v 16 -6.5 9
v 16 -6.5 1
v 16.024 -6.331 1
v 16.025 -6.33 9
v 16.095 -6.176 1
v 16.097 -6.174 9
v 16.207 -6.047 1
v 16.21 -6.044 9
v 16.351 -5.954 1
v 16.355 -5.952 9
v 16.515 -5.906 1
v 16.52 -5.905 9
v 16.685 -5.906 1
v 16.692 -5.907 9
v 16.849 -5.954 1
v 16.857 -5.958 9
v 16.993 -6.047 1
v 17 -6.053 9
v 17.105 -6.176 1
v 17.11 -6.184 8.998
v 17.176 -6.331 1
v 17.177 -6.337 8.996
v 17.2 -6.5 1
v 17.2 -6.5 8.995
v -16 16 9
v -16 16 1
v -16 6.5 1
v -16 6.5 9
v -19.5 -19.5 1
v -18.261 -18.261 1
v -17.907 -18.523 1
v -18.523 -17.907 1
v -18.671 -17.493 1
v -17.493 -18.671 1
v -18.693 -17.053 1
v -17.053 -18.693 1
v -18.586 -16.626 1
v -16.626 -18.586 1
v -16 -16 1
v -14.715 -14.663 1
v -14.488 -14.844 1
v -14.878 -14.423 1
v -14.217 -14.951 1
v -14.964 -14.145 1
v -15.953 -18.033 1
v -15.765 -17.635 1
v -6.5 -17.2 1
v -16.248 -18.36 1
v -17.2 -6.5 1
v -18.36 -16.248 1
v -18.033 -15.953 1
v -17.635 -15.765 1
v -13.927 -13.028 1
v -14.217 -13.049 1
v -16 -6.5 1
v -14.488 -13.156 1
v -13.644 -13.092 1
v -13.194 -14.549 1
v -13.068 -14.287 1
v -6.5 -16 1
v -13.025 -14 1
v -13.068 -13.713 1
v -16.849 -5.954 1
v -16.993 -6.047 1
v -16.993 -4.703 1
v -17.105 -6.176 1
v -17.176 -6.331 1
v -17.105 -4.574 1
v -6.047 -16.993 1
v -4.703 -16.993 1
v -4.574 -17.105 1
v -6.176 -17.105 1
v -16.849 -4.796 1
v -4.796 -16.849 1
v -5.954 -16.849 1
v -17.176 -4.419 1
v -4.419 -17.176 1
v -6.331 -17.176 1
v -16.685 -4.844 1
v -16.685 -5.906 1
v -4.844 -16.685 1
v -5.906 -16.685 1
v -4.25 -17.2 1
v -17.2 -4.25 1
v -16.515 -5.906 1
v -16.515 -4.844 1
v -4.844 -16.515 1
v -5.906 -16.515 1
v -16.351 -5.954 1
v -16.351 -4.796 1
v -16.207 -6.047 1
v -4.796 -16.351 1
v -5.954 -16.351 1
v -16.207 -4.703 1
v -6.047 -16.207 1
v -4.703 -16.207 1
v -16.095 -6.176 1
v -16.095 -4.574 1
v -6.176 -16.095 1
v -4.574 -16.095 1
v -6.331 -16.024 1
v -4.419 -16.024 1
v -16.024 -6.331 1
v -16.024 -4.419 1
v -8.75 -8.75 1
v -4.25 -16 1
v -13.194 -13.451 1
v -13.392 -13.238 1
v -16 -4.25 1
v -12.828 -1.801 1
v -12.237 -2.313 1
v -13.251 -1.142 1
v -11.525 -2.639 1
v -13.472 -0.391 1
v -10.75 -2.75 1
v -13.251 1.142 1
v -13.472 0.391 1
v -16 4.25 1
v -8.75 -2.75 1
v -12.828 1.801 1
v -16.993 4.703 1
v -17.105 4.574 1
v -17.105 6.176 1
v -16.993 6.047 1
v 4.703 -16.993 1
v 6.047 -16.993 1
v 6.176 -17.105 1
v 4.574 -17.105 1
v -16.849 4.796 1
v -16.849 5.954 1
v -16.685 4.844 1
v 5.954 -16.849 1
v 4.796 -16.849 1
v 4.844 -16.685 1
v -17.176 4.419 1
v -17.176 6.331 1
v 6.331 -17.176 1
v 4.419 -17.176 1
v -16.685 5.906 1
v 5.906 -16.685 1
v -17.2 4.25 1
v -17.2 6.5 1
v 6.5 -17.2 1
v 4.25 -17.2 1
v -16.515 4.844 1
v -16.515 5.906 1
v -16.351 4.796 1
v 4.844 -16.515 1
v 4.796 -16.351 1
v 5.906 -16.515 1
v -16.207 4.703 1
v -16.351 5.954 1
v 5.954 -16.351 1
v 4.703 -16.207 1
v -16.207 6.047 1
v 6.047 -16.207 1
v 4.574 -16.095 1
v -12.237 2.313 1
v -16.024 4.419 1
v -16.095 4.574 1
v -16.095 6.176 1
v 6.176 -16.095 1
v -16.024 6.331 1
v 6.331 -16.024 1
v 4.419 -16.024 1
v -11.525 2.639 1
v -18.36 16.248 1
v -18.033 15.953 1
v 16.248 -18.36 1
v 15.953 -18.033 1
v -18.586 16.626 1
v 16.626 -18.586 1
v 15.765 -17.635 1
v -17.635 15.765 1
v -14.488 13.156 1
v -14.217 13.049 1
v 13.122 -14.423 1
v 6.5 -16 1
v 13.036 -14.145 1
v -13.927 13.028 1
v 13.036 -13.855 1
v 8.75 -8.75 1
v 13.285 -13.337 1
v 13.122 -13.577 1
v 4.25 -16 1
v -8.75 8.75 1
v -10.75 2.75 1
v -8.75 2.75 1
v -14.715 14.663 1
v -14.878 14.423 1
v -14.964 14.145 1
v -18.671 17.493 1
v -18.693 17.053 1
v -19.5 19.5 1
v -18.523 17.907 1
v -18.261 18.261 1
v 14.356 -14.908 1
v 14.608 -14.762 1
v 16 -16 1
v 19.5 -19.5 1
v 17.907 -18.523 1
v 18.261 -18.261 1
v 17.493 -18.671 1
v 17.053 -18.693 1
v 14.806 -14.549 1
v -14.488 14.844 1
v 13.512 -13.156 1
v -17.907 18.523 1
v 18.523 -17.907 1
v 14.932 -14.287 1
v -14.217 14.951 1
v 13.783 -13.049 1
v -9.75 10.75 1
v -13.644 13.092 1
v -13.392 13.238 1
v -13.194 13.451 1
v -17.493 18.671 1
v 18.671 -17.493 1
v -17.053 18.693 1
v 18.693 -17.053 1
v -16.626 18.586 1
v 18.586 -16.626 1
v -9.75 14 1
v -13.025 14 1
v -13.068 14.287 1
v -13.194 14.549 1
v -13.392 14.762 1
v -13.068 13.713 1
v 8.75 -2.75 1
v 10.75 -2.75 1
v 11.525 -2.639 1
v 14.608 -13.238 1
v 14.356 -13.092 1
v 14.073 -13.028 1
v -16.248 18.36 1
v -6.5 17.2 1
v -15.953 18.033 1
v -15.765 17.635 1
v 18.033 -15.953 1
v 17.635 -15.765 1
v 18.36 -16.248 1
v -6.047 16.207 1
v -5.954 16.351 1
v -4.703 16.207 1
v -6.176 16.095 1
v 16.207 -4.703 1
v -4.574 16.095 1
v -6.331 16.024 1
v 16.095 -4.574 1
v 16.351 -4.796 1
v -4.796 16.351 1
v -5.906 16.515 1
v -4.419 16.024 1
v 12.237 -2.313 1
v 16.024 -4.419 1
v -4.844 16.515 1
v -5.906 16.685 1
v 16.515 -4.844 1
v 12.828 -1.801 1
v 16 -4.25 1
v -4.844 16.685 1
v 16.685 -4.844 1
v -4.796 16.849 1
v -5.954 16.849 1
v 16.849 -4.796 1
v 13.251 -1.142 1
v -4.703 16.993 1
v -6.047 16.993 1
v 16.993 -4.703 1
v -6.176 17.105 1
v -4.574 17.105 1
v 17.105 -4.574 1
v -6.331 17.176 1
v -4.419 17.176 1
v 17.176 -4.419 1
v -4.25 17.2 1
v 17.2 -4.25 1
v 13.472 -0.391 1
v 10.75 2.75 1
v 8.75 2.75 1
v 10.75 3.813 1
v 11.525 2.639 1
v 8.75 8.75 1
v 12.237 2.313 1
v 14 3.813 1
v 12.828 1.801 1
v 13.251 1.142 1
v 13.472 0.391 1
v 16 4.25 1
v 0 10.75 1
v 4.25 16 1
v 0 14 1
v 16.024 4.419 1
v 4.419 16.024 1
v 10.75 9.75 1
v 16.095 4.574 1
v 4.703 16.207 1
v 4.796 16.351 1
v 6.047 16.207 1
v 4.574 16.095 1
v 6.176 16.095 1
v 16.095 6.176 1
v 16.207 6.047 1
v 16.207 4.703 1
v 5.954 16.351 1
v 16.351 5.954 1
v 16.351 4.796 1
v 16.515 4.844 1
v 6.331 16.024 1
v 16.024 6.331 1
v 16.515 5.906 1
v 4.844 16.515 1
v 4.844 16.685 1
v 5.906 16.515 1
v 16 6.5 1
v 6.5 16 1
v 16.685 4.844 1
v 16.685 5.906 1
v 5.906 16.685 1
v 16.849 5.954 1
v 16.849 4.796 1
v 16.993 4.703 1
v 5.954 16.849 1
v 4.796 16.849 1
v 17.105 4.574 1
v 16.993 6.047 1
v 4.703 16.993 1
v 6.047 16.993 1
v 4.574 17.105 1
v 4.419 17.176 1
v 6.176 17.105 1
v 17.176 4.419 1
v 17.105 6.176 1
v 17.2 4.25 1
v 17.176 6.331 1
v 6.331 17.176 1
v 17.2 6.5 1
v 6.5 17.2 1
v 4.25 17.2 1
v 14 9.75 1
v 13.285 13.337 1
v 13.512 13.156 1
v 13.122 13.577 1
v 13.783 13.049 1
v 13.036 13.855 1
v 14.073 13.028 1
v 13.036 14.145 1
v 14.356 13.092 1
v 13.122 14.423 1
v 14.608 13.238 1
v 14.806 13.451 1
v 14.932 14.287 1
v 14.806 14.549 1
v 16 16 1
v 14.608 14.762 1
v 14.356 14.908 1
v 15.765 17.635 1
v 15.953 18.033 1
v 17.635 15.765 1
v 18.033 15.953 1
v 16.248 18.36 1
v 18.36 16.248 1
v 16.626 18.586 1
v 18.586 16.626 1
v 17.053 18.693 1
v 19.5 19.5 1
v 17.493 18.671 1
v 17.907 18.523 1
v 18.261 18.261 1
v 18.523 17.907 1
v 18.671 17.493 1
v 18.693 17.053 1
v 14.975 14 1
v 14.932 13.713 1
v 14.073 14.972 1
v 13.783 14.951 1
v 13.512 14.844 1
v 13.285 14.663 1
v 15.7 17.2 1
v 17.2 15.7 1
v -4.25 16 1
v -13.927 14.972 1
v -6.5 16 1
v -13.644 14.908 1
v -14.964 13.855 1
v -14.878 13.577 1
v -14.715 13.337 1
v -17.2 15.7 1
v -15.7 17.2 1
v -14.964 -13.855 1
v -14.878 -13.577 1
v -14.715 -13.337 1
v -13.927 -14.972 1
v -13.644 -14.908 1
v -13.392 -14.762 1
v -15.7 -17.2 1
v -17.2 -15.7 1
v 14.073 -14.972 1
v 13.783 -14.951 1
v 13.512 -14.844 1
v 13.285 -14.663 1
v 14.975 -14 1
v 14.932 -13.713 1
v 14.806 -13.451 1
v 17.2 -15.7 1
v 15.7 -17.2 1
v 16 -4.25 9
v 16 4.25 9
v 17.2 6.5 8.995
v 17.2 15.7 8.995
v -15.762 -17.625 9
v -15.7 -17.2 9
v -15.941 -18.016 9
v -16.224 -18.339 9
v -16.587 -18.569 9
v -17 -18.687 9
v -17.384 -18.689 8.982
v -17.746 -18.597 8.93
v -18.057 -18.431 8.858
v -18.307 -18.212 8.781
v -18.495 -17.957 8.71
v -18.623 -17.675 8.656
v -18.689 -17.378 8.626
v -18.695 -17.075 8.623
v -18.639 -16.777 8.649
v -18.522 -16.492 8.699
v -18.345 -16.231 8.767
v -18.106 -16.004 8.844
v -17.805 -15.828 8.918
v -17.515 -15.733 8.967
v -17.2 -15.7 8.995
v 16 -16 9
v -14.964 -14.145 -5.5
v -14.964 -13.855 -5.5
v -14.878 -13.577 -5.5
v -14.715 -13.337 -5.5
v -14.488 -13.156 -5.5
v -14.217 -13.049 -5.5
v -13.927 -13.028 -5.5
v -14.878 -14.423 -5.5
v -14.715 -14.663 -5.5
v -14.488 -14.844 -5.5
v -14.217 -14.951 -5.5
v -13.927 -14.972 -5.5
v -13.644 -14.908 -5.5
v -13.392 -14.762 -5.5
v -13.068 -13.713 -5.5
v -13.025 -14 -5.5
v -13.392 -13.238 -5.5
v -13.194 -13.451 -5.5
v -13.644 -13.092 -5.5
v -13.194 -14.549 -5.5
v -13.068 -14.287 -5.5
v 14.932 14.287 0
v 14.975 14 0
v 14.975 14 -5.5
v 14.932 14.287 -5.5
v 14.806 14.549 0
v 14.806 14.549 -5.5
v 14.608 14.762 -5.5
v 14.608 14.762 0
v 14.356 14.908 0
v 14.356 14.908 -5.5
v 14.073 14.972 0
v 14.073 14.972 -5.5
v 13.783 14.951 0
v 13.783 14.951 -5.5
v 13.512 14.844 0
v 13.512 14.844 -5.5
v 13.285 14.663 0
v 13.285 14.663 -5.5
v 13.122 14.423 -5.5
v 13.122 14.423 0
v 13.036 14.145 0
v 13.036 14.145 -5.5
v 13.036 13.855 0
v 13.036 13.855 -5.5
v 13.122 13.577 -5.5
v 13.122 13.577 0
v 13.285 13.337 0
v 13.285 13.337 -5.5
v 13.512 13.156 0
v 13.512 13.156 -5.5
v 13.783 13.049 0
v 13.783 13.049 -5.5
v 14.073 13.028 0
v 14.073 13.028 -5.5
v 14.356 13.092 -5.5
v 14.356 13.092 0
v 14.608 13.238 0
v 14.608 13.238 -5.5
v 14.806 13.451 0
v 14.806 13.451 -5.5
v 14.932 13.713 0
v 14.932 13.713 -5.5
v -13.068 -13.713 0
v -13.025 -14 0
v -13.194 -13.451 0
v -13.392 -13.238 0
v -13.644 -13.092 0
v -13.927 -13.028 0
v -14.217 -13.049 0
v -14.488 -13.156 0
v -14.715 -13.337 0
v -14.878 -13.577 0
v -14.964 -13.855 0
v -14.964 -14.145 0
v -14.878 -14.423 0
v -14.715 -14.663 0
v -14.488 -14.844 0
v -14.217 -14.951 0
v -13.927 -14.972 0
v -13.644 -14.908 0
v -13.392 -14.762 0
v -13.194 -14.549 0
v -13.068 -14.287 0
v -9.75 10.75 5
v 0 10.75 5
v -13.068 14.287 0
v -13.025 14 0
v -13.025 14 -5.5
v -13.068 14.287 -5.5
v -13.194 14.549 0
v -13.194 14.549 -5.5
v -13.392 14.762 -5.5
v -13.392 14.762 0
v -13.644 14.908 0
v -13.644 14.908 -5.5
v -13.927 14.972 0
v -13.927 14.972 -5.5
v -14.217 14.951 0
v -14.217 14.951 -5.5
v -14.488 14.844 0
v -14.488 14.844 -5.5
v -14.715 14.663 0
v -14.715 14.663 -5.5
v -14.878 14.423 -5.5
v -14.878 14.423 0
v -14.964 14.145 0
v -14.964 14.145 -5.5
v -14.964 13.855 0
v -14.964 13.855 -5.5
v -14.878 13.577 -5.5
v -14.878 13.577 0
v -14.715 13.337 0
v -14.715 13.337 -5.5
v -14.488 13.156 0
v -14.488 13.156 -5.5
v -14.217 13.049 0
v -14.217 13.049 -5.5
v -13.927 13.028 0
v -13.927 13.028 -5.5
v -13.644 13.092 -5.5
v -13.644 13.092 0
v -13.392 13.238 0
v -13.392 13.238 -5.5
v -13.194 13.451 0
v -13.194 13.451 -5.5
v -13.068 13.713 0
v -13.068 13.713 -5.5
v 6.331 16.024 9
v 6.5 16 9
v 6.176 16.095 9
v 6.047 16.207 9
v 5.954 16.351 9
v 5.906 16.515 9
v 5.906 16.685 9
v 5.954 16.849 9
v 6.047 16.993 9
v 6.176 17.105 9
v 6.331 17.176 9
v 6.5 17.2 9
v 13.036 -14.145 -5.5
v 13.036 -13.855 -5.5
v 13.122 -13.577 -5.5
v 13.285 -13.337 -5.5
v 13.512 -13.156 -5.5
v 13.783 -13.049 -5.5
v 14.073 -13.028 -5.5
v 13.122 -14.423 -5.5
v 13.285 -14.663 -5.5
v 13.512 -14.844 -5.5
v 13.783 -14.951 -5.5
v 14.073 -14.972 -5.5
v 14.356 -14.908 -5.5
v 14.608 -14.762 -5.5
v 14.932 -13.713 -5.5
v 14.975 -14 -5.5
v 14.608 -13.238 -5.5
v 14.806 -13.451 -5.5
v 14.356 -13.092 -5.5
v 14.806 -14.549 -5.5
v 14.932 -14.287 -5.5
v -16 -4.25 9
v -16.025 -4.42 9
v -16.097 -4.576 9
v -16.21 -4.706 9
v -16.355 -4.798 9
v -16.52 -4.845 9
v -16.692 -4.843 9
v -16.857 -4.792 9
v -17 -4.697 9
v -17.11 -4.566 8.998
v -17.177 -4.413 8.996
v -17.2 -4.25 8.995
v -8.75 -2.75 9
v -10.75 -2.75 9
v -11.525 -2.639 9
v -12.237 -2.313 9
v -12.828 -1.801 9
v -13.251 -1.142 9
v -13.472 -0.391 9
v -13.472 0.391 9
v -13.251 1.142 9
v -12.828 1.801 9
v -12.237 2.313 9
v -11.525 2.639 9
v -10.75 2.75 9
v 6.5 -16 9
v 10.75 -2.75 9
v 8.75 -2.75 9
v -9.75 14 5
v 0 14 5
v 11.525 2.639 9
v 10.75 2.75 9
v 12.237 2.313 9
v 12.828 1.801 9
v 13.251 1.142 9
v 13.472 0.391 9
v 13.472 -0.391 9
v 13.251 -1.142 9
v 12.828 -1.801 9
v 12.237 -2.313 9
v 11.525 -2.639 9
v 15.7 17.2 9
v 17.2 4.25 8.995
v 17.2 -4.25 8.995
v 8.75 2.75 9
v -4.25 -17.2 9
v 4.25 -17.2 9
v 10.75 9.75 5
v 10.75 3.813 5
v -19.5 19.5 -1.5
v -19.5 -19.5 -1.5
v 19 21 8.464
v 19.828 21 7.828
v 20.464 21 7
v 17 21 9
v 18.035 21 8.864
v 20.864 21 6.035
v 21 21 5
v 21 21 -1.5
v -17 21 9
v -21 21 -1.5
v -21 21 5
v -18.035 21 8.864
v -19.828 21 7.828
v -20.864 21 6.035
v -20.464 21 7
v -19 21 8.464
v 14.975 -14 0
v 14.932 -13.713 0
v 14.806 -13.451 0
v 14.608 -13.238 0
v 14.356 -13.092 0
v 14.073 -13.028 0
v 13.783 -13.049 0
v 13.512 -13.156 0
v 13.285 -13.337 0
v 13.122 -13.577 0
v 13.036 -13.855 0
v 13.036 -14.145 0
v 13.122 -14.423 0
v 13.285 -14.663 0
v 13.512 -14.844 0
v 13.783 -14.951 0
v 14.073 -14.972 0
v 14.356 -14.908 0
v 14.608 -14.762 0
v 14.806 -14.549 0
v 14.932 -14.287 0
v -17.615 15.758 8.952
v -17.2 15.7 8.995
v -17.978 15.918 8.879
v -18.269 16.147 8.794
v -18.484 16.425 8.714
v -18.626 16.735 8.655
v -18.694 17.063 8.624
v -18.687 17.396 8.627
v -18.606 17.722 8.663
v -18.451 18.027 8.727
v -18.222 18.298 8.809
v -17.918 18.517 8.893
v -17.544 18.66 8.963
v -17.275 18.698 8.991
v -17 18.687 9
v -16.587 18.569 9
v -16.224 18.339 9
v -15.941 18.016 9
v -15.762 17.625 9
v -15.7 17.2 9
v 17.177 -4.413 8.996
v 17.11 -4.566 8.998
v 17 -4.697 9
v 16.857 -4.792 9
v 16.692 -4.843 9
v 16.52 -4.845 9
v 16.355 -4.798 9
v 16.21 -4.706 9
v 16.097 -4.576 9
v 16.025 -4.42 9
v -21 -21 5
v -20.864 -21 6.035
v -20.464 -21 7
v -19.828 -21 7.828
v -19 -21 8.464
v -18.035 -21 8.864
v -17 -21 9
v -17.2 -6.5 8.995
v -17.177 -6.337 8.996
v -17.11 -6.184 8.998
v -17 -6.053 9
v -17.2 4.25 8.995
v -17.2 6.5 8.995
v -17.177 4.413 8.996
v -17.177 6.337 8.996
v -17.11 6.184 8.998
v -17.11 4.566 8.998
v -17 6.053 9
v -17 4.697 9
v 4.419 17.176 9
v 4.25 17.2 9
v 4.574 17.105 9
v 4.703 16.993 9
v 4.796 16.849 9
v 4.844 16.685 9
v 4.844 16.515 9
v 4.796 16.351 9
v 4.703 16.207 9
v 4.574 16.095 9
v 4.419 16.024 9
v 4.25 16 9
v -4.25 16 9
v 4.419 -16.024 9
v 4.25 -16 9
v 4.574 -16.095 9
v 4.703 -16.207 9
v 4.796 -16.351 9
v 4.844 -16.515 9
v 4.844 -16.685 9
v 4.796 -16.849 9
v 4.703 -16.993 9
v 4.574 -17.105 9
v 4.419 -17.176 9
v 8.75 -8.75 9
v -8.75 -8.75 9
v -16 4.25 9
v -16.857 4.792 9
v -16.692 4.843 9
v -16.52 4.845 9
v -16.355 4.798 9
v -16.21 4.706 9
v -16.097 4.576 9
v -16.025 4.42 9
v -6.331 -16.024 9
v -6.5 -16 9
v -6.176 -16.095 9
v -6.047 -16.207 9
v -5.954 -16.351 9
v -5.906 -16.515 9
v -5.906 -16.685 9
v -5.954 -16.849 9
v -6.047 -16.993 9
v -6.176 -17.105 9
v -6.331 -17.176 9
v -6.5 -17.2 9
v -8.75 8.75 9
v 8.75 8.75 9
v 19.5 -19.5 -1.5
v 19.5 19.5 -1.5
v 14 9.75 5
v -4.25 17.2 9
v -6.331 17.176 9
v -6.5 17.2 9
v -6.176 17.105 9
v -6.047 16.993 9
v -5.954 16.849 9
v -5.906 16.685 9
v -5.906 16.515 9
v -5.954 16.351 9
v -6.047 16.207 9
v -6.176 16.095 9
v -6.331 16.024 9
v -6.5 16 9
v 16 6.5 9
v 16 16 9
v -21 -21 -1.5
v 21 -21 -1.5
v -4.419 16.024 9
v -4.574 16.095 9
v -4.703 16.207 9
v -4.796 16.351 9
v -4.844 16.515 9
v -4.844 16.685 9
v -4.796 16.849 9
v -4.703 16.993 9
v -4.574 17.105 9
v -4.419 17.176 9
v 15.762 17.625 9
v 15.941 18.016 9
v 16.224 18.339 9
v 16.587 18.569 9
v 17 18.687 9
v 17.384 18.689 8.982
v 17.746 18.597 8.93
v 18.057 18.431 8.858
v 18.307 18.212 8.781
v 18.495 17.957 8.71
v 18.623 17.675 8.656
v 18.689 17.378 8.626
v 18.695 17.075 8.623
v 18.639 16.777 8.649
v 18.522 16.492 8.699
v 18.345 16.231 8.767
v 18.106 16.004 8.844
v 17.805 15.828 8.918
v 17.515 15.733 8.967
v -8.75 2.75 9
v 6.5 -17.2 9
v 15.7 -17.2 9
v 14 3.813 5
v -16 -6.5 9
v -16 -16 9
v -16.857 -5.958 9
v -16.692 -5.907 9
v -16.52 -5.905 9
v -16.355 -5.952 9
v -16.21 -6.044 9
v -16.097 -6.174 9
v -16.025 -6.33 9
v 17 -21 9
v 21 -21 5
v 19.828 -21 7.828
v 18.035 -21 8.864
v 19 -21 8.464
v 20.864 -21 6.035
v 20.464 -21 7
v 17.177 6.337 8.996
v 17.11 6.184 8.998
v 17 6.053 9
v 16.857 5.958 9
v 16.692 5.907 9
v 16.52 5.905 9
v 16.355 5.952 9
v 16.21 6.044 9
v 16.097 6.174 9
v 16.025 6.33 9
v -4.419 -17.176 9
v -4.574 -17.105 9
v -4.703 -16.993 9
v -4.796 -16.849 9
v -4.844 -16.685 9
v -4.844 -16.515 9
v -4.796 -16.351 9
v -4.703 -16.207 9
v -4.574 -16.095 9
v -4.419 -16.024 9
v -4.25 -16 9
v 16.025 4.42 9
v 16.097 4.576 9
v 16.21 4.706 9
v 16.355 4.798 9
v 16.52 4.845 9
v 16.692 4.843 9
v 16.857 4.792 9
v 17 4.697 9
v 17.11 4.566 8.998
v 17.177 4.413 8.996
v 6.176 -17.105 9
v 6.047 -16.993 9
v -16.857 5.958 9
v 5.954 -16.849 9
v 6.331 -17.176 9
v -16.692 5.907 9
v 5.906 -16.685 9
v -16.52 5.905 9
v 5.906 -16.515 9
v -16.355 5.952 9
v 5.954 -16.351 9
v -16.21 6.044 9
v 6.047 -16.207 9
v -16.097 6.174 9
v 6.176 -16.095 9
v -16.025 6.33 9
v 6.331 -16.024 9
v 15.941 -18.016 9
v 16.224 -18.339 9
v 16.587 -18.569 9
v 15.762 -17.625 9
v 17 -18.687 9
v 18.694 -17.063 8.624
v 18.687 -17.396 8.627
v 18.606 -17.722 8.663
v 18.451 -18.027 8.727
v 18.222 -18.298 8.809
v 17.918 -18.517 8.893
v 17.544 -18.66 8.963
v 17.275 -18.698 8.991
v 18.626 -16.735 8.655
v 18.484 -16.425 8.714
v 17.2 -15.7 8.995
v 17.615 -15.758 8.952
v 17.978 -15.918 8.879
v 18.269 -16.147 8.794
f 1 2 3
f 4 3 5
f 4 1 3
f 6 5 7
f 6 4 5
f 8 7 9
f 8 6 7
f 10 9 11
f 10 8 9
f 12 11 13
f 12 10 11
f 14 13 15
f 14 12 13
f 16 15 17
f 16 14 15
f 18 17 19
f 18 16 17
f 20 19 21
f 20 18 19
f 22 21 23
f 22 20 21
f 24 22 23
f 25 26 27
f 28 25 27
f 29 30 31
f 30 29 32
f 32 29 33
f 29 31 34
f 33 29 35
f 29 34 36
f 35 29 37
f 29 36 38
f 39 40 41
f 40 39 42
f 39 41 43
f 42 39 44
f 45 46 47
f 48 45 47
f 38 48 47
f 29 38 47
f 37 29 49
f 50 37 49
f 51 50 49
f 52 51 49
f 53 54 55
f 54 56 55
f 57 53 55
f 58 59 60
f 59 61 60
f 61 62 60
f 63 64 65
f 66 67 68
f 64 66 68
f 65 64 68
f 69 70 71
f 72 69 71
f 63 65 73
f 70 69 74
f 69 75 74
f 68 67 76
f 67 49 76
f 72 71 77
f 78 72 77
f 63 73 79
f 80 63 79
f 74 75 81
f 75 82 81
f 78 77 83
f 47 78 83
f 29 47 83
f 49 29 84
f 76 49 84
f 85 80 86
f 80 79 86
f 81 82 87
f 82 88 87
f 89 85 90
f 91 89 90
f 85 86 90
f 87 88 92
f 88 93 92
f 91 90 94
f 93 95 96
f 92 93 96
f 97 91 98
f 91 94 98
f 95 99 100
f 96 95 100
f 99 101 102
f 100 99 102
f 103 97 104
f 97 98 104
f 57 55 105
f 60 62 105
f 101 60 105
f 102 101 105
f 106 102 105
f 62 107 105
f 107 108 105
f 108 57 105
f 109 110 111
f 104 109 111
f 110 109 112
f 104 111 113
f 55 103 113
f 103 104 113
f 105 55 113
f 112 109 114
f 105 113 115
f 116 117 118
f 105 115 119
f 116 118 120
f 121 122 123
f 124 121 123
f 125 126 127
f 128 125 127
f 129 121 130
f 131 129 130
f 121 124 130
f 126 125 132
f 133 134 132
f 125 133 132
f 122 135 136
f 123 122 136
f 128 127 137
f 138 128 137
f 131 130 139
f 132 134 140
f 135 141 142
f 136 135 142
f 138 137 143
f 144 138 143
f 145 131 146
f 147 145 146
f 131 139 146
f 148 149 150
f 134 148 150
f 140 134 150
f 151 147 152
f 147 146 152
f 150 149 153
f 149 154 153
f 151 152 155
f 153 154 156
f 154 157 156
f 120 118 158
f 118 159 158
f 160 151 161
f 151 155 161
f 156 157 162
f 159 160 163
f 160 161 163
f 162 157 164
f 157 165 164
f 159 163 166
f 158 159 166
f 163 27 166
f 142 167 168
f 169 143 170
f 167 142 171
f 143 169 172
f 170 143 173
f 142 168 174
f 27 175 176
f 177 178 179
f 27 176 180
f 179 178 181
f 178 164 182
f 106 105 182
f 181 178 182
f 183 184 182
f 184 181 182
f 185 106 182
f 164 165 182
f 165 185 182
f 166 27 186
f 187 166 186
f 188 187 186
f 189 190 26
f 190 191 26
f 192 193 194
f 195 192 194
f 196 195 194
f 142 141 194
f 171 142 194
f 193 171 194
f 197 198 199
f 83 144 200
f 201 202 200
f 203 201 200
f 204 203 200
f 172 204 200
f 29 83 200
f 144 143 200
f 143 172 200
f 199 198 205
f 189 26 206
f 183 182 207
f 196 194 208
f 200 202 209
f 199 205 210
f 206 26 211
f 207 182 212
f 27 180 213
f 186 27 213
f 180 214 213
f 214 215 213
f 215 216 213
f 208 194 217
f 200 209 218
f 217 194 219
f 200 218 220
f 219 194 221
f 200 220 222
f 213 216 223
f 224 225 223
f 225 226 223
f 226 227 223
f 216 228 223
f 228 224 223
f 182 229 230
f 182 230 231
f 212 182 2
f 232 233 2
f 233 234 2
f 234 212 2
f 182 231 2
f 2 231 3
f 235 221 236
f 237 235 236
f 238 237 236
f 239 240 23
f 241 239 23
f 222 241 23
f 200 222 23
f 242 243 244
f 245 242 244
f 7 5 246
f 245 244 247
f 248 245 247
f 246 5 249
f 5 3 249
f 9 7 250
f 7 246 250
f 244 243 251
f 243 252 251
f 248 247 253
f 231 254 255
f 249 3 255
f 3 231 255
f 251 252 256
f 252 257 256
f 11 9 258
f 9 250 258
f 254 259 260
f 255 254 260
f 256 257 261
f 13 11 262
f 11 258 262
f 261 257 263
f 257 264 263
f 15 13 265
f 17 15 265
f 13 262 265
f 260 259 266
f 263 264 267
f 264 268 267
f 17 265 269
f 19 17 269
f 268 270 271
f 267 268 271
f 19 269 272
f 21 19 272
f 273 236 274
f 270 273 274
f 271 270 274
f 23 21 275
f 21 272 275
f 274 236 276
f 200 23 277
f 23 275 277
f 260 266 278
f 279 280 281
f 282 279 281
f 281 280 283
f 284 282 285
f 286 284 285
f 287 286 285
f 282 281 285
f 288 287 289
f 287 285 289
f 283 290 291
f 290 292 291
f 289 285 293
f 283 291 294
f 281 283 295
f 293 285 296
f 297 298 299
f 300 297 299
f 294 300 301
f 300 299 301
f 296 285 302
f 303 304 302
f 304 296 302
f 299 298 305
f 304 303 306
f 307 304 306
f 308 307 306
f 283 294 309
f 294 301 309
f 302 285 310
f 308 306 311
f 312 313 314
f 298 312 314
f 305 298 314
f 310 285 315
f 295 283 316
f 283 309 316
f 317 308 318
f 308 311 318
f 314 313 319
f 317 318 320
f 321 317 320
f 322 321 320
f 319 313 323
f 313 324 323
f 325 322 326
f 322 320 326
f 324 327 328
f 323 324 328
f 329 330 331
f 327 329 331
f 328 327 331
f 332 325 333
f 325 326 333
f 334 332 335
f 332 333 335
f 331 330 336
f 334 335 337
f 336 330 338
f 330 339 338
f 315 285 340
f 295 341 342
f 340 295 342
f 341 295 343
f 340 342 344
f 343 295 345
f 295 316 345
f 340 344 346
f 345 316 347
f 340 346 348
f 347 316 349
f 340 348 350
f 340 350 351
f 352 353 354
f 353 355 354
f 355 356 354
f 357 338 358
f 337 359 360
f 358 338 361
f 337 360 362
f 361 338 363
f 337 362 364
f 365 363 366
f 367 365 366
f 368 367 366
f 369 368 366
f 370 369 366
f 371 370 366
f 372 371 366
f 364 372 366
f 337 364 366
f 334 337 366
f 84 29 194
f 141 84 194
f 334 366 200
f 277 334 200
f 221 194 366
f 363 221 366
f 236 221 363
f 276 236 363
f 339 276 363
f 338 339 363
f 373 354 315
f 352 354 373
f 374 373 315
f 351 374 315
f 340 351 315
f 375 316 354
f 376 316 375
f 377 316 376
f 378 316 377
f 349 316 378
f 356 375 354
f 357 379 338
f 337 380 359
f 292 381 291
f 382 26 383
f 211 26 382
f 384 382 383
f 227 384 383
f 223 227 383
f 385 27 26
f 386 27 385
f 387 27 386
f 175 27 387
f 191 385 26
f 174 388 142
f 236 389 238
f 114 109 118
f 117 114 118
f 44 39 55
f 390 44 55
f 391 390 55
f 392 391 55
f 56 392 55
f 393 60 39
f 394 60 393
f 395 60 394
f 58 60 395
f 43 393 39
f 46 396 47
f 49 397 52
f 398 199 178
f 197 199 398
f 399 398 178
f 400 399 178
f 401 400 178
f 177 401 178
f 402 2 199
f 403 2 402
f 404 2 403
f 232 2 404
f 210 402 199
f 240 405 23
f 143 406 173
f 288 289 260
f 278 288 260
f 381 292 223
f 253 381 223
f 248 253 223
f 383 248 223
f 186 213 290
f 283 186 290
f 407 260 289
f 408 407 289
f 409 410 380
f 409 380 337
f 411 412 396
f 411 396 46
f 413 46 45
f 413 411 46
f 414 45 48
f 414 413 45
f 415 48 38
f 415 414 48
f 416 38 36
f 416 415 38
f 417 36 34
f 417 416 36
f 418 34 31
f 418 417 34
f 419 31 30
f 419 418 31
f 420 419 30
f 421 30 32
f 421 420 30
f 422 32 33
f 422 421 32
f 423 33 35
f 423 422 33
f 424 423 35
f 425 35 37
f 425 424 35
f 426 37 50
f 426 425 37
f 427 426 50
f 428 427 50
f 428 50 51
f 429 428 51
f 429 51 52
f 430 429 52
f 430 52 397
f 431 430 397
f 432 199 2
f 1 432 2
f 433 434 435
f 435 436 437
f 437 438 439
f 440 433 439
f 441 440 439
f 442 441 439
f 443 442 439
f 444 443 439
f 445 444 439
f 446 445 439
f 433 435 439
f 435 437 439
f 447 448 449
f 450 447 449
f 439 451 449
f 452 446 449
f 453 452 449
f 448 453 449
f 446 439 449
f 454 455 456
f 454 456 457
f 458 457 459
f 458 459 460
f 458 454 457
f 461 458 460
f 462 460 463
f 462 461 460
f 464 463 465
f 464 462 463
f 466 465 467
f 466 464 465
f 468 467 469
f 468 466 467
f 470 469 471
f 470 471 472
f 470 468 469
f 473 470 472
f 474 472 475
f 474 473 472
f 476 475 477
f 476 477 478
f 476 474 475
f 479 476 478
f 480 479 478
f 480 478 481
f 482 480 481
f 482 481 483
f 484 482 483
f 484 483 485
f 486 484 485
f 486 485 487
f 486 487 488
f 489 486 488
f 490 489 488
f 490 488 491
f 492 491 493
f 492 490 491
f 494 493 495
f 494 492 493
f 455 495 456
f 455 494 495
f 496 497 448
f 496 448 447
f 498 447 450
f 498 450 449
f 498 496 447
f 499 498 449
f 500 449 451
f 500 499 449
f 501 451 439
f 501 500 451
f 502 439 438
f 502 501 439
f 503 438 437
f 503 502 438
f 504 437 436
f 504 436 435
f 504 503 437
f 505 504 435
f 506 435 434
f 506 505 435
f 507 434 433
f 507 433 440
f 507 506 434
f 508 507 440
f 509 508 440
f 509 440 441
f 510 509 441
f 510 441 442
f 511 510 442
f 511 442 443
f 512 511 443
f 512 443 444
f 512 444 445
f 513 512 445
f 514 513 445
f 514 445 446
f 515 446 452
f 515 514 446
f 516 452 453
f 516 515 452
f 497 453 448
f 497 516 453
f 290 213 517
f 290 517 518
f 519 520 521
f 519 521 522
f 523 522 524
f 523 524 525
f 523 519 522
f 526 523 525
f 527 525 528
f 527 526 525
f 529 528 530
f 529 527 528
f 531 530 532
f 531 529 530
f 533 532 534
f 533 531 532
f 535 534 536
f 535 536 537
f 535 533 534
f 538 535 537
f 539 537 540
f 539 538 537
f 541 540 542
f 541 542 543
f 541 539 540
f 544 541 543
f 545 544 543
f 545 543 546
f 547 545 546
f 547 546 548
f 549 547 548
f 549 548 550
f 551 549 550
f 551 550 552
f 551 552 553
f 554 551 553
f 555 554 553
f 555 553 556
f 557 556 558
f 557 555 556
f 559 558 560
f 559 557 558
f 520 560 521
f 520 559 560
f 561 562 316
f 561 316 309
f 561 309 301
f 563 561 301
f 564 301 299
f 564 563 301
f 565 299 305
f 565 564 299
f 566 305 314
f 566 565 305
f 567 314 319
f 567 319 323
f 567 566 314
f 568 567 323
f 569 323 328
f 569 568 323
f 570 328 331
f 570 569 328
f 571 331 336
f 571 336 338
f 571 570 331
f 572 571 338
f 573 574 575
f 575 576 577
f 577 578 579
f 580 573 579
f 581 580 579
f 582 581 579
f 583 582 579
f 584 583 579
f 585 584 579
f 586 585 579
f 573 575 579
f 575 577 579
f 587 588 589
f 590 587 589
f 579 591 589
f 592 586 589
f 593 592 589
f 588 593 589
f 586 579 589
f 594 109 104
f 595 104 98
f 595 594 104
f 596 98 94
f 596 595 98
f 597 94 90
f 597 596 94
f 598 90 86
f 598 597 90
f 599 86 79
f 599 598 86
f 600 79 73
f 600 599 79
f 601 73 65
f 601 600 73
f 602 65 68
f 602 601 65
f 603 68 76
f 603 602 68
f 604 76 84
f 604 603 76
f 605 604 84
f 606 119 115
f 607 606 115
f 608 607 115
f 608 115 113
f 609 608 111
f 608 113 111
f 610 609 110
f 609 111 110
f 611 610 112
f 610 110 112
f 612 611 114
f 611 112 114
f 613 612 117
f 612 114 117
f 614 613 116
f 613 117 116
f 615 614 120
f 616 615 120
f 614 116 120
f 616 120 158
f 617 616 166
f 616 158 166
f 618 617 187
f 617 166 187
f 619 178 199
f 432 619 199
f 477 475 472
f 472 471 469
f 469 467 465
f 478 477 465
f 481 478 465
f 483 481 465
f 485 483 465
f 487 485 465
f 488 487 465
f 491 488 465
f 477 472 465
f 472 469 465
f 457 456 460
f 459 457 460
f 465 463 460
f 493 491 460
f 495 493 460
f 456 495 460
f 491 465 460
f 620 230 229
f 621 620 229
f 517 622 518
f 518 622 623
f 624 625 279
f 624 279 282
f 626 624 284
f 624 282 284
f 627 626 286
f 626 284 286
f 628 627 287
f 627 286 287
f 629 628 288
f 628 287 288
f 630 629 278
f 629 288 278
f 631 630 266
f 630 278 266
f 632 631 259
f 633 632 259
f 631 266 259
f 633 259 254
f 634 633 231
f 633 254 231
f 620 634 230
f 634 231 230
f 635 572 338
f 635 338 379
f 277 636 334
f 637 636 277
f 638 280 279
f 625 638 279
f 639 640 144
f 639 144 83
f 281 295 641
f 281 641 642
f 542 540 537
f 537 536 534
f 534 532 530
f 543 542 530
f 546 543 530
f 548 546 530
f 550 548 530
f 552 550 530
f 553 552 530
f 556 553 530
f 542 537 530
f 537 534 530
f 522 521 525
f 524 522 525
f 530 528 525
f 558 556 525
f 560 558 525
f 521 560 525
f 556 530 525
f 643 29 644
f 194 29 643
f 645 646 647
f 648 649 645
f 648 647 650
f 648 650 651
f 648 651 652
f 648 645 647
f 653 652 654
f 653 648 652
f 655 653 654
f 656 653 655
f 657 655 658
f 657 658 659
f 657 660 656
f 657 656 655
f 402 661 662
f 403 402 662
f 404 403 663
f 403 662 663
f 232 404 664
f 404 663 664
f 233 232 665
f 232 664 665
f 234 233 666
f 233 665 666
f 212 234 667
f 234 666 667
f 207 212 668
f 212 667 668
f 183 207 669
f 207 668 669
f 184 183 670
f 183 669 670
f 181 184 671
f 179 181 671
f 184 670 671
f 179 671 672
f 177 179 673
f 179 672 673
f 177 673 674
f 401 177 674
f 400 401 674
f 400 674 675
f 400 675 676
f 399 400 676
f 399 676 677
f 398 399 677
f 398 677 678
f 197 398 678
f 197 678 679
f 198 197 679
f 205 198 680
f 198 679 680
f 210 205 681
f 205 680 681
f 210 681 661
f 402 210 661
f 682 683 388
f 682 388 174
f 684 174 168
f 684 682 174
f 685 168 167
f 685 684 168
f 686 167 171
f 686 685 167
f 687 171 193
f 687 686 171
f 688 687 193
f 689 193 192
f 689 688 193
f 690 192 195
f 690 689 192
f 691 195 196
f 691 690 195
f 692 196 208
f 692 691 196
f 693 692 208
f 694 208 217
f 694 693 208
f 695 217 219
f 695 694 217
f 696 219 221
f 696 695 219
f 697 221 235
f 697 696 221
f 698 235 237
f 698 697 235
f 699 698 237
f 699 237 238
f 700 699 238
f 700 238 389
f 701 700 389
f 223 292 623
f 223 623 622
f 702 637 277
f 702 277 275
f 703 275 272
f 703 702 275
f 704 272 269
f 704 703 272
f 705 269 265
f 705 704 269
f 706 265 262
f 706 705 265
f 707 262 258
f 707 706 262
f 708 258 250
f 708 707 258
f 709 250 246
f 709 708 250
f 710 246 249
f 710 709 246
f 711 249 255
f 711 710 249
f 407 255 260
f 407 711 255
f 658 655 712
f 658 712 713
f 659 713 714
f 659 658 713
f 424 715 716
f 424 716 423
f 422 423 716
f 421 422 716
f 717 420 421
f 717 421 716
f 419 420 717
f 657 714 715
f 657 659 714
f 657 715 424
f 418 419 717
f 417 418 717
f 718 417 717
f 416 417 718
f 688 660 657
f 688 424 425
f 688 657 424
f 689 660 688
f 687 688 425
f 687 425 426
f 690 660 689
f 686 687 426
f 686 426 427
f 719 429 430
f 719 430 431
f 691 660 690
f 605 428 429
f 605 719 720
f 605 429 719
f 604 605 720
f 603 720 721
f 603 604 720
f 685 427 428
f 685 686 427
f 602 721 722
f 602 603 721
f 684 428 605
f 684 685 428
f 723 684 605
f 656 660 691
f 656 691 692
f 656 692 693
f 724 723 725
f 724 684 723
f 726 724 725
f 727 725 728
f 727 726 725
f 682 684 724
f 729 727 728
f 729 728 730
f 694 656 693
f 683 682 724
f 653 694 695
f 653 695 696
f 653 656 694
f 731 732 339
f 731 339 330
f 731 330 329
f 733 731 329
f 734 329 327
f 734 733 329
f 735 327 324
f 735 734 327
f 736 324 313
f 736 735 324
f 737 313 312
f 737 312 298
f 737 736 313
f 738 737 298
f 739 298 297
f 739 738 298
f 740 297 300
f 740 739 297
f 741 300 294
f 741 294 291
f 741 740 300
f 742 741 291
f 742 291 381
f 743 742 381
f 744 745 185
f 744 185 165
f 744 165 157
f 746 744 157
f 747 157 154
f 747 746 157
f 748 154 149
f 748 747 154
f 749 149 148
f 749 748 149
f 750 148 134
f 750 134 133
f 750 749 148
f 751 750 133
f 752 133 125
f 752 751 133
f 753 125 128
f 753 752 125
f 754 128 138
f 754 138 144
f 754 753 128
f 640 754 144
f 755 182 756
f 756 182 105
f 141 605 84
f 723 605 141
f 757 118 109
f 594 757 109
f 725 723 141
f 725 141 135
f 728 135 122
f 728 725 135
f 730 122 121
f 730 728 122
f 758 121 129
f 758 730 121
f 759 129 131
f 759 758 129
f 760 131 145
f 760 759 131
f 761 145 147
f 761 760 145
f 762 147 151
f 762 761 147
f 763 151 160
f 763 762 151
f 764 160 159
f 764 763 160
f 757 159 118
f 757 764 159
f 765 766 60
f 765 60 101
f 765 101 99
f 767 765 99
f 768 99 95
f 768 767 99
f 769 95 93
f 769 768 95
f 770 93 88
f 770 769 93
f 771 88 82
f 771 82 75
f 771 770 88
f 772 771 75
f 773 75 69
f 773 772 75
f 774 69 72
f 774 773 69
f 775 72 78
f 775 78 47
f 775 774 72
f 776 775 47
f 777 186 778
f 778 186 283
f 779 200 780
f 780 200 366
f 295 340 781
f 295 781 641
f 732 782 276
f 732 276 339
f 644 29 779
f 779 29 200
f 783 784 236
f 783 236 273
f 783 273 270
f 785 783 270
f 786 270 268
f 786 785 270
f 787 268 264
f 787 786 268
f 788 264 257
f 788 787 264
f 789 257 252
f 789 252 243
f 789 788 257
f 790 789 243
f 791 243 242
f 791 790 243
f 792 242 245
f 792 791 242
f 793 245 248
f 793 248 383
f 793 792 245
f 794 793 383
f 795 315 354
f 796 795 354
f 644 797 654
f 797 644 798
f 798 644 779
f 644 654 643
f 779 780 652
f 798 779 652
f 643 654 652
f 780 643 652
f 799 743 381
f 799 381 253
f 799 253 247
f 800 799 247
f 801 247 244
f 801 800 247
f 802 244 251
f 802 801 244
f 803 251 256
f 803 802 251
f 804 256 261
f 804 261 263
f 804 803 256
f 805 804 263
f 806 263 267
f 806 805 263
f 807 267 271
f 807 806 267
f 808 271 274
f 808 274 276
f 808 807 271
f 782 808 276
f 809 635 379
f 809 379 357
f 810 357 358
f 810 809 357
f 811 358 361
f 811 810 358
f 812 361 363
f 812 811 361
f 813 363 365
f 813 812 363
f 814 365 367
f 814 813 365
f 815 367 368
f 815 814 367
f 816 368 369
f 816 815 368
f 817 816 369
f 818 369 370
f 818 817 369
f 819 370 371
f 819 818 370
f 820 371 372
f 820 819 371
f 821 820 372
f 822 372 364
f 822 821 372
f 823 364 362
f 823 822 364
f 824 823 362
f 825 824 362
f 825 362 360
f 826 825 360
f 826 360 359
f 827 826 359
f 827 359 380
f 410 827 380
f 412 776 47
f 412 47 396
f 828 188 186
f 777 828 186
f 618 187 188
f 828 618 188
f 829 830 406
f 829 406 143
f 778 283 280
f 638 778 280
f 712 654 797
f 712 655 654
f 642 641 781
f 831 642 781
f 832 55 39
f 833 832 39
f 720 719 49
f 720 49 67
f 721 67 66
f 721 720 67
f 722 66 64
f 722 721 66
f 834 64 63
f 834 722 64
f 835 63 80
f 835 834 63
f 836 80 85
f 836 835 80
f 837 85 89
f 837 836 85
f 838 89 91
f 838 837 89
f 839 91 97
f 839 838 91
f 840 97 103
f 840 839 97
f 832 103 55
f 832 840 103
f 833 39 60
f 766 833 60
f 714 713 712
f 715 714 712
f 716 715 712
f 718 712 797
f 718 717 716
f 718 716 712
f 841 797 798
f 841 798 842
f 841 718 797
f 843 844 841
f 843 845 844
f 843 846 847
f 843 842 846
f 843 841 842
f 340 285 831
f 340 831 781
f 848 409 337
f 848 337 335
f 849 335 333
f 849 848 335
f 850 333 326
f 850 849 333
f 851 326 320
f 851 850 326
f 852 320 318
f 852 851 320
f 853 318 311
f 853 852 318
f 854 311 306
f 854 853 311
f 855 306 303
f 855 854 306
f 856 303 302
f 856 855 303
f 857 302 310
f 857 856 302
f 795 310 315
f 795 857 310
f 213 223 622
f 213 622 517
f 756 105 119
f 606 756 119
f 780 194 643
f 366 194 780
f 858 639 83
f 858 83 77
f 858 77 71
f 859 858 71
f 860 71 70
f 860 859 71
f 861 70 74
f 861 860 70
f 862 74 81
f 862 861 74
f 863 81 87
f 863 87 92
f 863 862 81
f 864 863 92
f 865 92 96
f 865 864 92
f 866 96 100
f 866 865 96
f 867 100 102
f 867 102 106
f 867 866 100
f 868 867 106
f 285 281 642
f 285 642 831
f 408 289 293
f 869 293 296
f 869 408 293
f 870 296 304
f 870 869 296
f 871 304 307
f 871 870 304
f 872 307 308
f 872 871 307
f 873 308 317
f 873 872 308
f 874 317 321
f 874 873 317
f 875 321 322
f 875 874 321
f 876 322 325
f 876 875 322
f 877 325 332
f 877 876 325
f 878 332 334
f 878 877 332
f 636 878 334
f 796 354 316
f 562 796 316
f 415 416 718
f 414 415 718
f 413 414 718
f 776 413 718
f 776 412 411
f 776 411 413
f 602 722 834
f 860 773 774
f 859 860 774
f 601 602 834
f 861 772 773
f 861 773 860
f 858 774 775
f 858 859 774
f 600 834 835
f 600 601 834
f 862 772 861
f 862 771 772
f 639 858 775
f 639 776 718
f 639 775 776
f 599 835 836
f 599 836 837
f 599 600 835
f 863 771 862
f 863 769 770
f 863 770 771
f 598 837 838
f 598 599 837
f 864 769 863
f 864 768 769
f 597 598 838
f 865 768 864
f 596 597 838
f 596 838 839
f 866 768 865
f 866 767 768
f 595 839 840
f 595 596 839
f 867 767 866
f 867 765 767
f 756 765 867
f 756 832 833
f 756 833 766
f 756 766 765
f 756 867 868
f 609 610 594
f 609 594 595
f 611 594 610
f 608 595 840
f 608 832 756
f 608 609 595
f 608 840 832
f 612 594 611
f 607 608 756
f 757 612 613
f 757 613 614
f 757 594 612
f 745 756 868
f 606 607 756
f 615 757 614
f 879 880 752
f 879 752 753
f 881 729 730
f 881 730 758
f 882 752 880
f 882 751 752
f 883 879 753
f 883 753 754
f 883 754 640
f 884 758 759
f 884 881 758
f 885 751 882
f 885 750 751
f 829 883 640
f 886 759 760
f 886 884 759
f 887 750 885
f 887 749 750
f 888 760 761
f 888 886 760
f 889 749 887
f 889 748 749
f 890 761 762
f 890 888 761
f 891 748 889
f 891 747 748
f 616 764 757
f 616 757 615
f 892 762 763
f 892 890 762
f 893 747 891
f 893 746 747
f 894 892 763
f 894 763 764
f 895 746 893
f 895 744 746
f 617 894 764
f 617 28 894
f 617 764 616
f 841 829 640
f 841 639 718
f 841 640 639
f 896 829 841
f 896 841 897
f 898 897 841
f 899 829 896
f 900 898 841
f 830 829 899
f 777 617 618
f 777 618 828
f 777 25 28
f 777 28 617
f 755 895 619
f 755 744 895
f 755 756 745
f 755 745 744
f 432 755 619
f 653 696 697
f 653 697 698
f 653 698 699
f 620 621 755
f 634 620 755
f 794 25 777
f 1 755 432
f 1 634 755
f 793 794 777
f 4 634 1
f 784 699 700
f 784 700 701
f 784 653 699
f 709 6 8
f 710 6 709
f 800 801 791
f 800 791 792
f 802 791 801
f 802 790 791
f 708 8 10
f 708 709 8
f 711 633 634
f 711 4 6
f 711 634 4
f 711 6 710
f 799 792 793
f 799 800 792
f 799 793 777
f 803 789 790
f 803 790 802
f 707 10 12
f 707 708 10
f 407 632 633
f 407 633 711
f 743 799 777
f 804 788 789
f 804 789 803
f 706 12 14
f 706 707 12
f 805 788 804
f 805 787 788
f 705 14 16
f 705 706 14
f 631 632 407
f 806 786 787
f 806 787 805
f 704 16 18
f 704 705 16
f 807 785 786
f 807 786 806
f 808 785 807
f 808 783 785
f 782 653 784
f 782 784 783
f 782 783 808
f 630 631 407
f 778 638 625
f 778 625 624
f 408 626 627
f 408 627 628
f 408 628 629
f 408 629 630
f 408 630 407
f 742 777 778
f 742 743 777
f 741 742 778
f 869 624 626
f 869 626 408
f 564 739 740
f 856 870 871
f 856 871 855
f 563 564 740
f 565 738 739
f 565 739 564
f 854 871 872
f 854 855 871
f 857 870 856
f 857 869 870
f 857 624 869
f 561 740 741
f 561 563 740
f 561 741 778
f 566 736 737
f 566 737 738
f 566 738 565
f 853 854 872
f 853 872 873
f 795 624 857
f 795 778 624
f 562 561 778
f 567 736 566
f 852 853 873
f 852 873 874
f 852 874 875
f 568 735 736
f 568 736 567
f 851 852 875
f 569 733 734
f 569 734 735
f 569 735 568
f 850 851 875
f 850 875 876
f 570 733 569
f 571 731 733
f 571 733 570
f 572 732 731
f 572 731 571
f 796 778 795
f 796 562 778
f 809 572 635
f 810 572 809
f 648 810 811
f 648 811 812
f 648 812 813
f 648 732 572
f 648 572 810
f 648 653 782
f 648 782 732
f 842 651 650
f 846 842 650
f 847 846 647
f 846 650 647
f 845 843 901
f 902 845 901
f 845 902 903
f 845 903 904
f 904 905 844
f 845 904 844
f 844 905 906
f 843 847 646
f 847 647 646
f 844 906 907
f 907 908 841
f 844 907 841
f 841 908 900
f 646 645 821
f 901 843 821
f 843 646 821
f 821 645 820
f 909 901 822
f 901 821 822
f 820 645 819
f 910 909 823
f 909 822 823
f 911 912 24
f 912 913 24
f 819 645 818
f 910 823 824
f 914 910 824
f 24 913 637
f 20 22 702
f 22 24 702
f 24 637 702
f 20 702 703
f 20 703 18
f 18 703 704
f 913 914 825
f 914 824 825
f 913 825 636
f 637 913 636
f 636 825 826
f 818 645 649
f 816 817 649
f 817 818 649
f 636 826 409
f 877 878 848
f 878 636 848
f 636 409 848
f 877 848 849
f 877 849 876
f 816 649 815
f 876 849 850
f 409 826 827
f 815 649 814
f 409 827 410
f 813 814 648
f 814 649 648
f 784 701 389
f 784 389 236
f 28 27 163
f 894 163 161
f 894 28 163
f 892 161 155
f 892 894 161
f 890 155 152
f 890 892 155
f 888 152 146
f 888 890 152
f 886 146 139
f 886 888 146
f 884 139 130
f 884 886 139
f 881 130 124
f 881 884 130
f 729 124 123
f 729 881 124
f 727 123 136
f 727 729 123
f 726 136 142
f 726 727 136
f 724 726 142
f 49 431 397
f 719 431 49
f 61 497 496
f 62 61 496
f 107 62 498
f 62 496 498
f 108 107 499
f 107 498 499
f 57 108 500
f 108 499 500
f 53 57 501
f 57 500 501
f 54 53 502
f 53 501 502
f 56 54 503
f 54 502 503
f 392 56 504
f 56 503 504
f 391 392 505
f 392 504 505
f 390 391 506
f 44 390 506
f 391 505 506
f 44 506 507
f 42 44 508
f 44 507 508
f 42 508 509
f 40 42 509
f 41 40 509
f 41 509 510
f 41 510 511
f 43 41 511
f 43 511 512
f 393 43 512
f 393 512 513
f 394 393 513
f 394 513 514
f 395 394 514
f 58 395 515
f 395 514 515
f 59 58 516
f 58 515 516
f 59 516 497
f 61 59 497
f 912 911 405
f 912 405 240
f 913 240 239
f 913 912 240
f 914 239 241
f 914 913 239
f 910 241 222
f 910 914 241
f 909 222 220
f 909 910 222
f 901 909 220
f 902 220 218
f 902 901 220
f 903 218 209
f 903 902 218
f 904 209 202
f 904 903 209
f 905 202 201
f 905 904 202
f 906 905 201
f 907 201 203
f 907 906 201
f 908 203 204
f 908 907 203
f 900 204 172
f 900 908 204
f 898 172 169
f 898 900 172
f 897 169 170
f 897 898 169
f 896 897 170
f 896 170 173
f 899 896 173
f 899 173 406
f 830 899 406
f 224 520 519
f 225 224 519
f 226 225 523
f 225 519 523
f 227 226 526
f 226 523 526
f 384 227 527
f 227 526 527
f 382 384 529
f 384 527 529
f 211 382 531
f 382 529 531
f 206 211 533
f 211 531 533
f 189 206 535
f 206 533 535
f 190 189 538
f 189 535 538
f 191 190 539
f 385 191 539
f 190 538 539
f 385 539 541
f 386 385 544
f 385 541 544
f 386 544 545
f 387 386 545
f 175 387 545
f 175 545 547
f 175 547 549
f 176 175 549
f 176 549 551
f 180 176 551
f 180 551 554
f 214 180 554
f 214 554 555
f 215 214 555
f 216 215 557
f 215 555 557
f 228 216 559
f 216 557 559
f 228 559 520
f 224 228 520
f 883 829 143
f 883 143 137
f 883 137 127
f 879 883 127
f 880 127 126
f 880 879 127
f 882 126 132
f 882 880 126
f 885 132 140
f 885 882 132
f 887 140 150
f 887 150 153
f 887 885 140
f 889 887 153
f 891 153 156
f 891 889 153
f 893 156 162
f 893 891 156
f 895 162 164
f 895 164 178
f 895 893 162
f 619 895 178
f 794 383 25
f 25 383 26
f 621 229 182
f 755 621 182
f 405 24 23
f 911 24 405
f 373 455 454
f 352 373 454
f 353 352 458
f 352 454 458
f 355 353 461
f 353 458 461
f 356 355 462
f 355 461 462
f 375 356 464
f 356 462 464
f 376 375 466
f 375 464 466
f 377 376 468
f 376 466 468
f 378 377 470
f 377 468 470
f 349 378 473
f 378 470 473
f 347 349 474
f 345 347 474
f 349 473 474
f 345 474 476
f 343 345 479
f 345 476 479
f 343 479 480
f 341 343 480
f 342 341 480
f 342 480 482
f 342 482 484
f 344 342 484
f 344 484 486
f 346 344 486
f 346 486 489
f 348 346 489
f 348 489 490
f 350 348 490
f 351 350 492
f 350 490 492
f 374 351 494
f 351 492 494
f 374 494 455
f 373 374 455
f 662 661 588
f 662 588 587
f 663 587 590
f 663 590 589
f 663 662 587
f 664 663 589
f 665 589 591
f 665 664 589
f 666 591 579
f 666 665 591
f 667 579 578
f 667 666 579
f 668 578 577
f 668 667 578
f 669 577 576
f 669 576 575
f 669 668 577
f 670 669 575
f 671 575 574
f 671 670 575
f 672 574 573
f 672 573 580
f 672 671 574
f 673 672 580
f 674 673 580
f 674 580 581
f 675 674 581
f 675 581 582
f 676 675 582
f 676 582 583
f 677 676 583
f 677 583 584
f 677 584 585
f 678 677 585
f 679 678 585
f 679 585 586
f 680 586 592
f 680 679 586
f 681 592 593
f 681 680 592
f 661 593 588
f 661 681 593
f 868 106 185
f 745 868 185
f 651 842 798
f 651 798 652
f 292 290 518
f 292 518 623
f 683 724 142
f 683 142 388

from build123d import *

# Parameters (mm, degrees)
F0_W        = 39
F0_H        = 39
F0_R        = 0.975
F1_DEPTH    = 9
F2_T1_DEPTH = 62
F3_DEPTH    = 5.5
F4_DEPTH    = 1.5
F5_DEPTH    = 2.5
F6_DEPTH    = 1.5
F7_DEPTH    = 5
F8_DEPTH    = 1


# Not quite as in the source:
# - a fillet or chamfer that OpenCascade refuses, or shapes differently, is made with other operations: its cross-section is extruded or revolved along the edge and cut away or added


with BuildPart() as f1:
    # F0 (on Top) → F1 (new body)
    with BuildSketch(Plane.XY):
        Polygon((-2.625, 21), (-21, 21), (-21, -21), (-2.625, -21), (2.625, -21), (21, -21), (21, 21), (2.625, 21), align=None)
        Rectangle(F0_W, F0_H, mode=Mode.SUBTRACT)
        Rectangle(F0_W, F0_H)
        with BuildLine():
            ThreePointArc((16, 4.25), (16.6, 4.85), (17.2, 4.25))
            Line((17.2, 4.25), (17.2, -4.25))
            ThreePointArc((17.2, -4.25), (16.6, -4.85), (16, -4.25))
            Line((16, -4.25), (16, -6.5))
            ThreePointArc((16, -6.5), (16.6, -5.9), (17.2, -6.5))
            Line((17.2, -6.5), (17.2, -15.7))
            ThreePointArc((17.2, -15.7), (18.2606601718, -18.2606601718), (15.7, -17.2))
            Line((15.7, -17.2), (6.5, -17.2))
            ThreePointArc((6.5, -17.2), (5.9, -16.6), (6.5, -16))
            Line((6.5, -16), (4.25, -16))
            ThreePointArc((4.25, -16), (4.85, -16.6), (4.25, -17.2))
            Line((4.25, -17.2), (-4.25, -17.2))
            ThreePointArc((-4.25, -17.2), (-4.85, -16.6), (-4.25, -16))
            Line((-4.25, -16), (-6.5, -16))
            ThreePointArc((-6.5, -16), (-5.9, -16.6), (-6.5, -17.2))
            Line((-6.5, -17.2), (-15.7, -17.2))
            ThreePointArc((-15.7, -17.2), (-18.2606601718, -18.2606601718), (-17.2, -15.7))
            Line((-17.2, -15.7), (-17.2, -6.5))
            ThreePointArc((-17.2, -6.5), (-16.6, -5.9), (-16, -6.5))
            Line((-16, -6.5), (-16, -4.25))
            ThreePointArc((-16, -4.25), (-16.6, -4.85), (-17.2, -4.25))
            Line((-17.2, -4.25), (-17.2, 4.25))
            ThreePointArc((-17.2, 4.25), (-16.6, 4.85), (-16, 4.25))
            Line((-16, 4.25), (-16, 6.5))
            ThreePointArc((-16, 6.5), (-16.6, 5.9), (-17.2, 6.5))
            Line((-17.2, 6.5), (-17.2, 15.7))
            ThreePointArc((-17.2, 15.7), (-18.2606601718, 18.2606601718), (-15.7, 17.2))
            Line((-15.7, 17.2), (-6.5, 17.2))
            ThreePointArc((-6.5, 17.2), (-5.9, 16.6), (-6.5, 16))
            Line((-6.5, 16), (-4.25, 16))
            ThreePointArc((-4.25, 16), (-4.85, 16.6), (-4.25, 17.2))
            Line((-4.25, 17.2), (4.25, 17.2))
            ThreePointArc((4.25, 17.2), (4.85, 16.6), (4.25, 16))
            Line((4.25, 16), (6.5, 16))
            ThreePointArc((6.5, 16), (5.9, 16.6), (6.5, 17.2))
            Line((6.5, 17.2), (15.7, 17.2))
            ThreePointArc((15.7, 17.2), (18.2606601718, 18.2606601718), (17.2, 15.7))
            Line((17.2, 15.7), (17.2, 6.5))
            ThreePointArc((17.2, 6.5), (16.6, 5.9), (16, 6.5))
            Line((16, 6.5), (16, 4.25))
        make_face(mode=Mode.SUBTRACT)
        Polygon((16, -4.25), (16, 4.25), (16, 6.5), (16, 16), (6.5, 16), (4.25, 16), (-4.25, 16), (-6.5, 16), (-16, 16), (-16, 6.5), (-16, 4.25), (-16, -4.25), (-16, -6.5), (-16, -16), (-6.5, -16), (-4.25, -16), (4.25, -16), (6.5, -16), (16, -16), (16, -6.5), align=None)
        with Locations((-14, -14)):
            Circle(F0_R, mode=Mode.SUBTRACT)
        with Locations((14, -14)):
            Circle(F0_R, mode=Mode.SUBTRACT)
        with Locations((-14, 14)):
            Circle(F0_R, mode=Mode.SUBTRACT)
        Polygon((-8.75, 14), (0, 14), (0, 10.75), (-8.75, 10.75), (-9.75, 10.75), (-9.75, 14), align=None, mode=Mode.SUBTRACT)
        with BuildLine():
            Line((-8.75, 8.75), (8.75, 8.75))
            Line((8.75, 8.75), (8.75, 2.75))
            Line((8.75, 2.75), (10.75, 2.75))
            ThreePointArc((10.75, 2.75), (13.5, 0), (10.75, -2.75))
            Line((10.75, -2.75), (8.75, -2.75))
            Line((8.75, -2.75), (8.75, -8.75))
            Line((8.75, -8.75), (-8.75, -8.75))
            Line((-8.75, -8.75), (-8.75, -2.75))
            Line((-8.75, -2.75), (-10.75, -2.75))
            ThreePointArc((-10.75, -2.75), (-13.5, 0), (-10.75, 2.75))
            Line((-10.75, 2.75), (-8.75, 2.75))
            Line((-8.75, 2.75), (-8.75, 8.75))
        make_face(mode=Mode.SUBTRACT)
        Polygon((10.75, 3.8126846775), (10.75, 8.75), (10.75, 9.75), (14, 9.75), (14, 8.75), (14, 3.8126846775), align=None, mode=Mode.SUBTRACT)
        with Locations((14, 14)):
            Circle(F0_R, mode=Mode.SUBTRACT)
        Polygon((0, 10.75), (0, 14), (-8.75, 14), (-9.75, 14), (-9.75, 10.75), (-8.75, 10.75), align=None)
        Polygon((10.75, 9.75), (10.75, 8.75), (10.75, 3.8126846775), (14, 3.8126846775), (14, 8.75), (14, 9.75), align=None)
        with Locations((14, -14)):
            Circle(F0_R)
        with Locations((-14, -14)):
            Circle(F0_R)
        with Locations((-14, 14)):
            Circle(F0_R)
        with Locations((14, 14)):
            Circle(F0_R)
    extrude(amount=F1_DEPTH)

    # F2: fillet of radius 4 on 2 edges, made by hand

    # F2_s2 → F2_t1 (cut)
    with BuildSketch(Plane.XZ.offset(-31)):
        with BuildLine():
            ThreePointArc((-21, 5), (-19.8284271247, 7.8284271247), (-17, 9))
            Line((-17, 9), (-21, 9))
            Line((-21, 9), (-21, 5))
        make_face()
        with BuildLine():
            ThreePointArc((21, 5), (19.8284271247, 7.8284271247), (17, 9))
            Line((17, 9), (21, 9))
            Line((21, 9), (21, 5))
        make_face()
    extrude(amount=F2_T1_DEPTH, mode=Mode.SUBTRACT)

    # F0 (on Top) → F3 (join)
    with BuildSketch(Plane.XY):
        with Locations((-14, -14)):
            Circle(F0_R)
        with Locations((14, -14)):
            Circle(F0_R)
        with Locations((-14, 14)):
            Circle(F0_R)
        with Locations((14, 14)):
            Circle(F0_R)
    extrude(amount=-F3_DEPTH)

    # F0 (on Top) → F4 (join)
    with BuildSketch(Plane.XY):
        Rectangle(F0_W, F0_H)
        with BuildLine():
            ThreePointArc((16, 4.25), (16.6, 4.85), (17.2, 4.25))
            Line((17.2, 4.25), (17.2, -4.25))
            ThreePointArc((17.2, -4.25), (16.6, -4.85), (16, -4.25))
            Line((16, -4.25), (16, -6.5))
            ThreePointArc((16, -6.5), (16.6, -5.9), (17.2, -6.5))
            Line((17.2, -6.5), (17.2, -15.7))
            ThreePointArc((17.2, -15.7), (18.2606601718, -18.2606601718), (15.7, -17.2))
            Line((15.7, -17.2), (6.5, -17.2))
            ThreePointArc((6.5, -17.2), (5.9, -16.6), (6.5, -16))
            Line((6.5, -16), (4.25, -16))
            ThreePointArc((4.25, -16), (4.85, -16.6), (4.25, -17.2))
            Line((4.25, -17.2), (-4.25, -17.2))
            ThreePointArc((-4.25, -17.2), (-4.85, -16.6), (-4.25, -16))
            Line((-4.25, -16), (-6.5, -16))
            ThreePointArc((-6.5, -16), (-5.9, -16.6), (-6.5, -17.2))
            Line((-6.5, -17.2), (-15.7, -17.2))
            ThreePointArc((-15.7, -17.2), (-18.2606601718, -18.2606601718), (-17.2, -15.7))
            Line((-17.2, -15.7), (-17.2, -6.5))
            ThreePointArc((-17.2, -6.5), (-16.6, -5.9), (-16, -6.5))
            Line((-16, -6.5), (-16, -4.25))
            ThreePointArc((-16, -4.25), (-16.6, -4.85), (-17.2, -4.25))
            Line((-17.2, -4.25), (-17.2, 4.25))
            ThreePointArc((-17.2, 4.25), (-16.6, 4.85), (-16, 4.25))
            Line((-16, 4.25), (-16, 6.5))
            ThreePointArc((-16, 6.5), (-16.6, 5.9), (-17.2, 6.5))
            Line((-17.2, 6.5), (-17.2, 15.7))
            ThreePointArc((-17.2, 15.7), (-18.2606601718, 18.2606601718), (-15.7, 17.2))
            Line((-15.7, 17.2), (-6.5, 17.2))
            ThreePointArc((-6.5, 17.2), (-5.9, 16.6), (-6.5, 16))
            Line((-6.5, 16), (-4.25, 16))
            ThreePointArc((-4.25, 16), (-4.85, 16.6), (-4.25, 17.2))
            Line((-4.25, 17.2), (4.25, 17.2))
            ThreePointArc((4.25, 17.2), (4.85, 16.6), (4.25, 16))
            Line((4.25, 16), (6.5, 16))
            ThreePointArc((6.5, 16), (5.9, 16.6), (6.5, 17.2))
            Line((6.5, 17.2), (15.7, 17.2))
            ThreePointArc((15.7, 17.2), (18.2606601718, 18.2606601718), (17.2, 15.7))
            Line((17.2, 15.7), (17.2, 6.5))
            ThreePointArc((17.2, 6.5), (16.6, 5.9), (16, 6.5))
            Line((16, 6.5), (16, 4.25))
        make_face(mode=Mode.SUBTRACT)
    extrude(amount=-F4_DEPTH)

    # F5 (cut): a face of the model
    f5_faces = [f1.faces().sort_by_distance(p)[0] for p in [
        (-18.9484567107, 0, -1.5),
    ]]
    extrude(f5_faces, amount=-F5_DEPTH, mode=Mode.SUBTRACT)

    # F0 (on Top) → F6 (join)
    with BuildSketch(Plane.XY):
        Polygon((-2.625, 21), (-21, 21), (-21, -21), (-2.625, -21), (2.625, -21), (21, -21), (21, 21), (2.625, 21), align=None)
        Rectangle(F0_W, F0_H, mode=Mode.SUBTRACT)
    extrude(amount=-F6_DEPTH)

    # F0 (on Top) → F7 (cut)
    with BuildSketch(Plane.XY):
        Polygon((10.75, 9.75), (10.75, 8.75), (10.75, 3.8126846775), (14, 3.8126846775), (14, 8.75), (14, 9.75), align=None)
        Polygon((0, 10.75), (0, 14), (-8.75, 14), (-9.75, 14), (-9.75, 10.75), (-8.75, 10.75), align=None)
    extrude(amount=F7_DEPTH, mode=Mode.SUBTRACT)

    # F0 (on Top) → F8 (cut)
    with BuildSketch(Plane.XY):
        Polygon((16, -4.25), (16, 4.25), (16, 6.5), (16, 16), (6.5, 16), (4.25, 16), (-4.25, 16), (-6.5, 16), (-16, 16), (-16, 6.5), (-16, 4.25), (-16, -4.25), (-16, -6.5), (-16, -16), (-6.5, -16), (-4.25, -16), (4.25, -16), (6.5, -16), (16, -16), (16, -6.5), align=None)
        with Locations((-14, -14)):
            Circle(F0_R, mode=Mode.SUBTRACT)
        with Locations((14, -14)):
            Circle(F0_R, mode=Mode.SUBTRACT)
        with Locations((-14, 14)):
            Circle(F0_R, mode=Mode.SUBTRACT)
        Polygon((-8.75, 14), (0, 14), (0, 10.75), (-8.75, 10.75), (-9.75, 10.75), (-9.75, 14), align=None, mode=Mode.SUBTRACT)
        with BuildLine():
            Line((-8.75, 8.75), (8.75, 8.75))
            Line((8.75, 8.75), (8.75, 2.75))
            Line((8.75, 2.75), (10.75, 2.75))
            ThreePointArc((10.75, 2.75), (13.5, 0), (10.75, -2.75))
            Line((10.75, -2.75), (8.75, -2.75))
            Line((8.75, -2.75), (8.75, -8.75))
            Line((8.75, -8.75), (-8.75, -8.75))
            Line((-8.75, -8.75), (-8.75, -2.75))
            Line((-8.75, -2.75), (-10.75, -2.75))
            ThreePointArc((-10.75, -2.75), (-13.5, 0), (-10.75, 2.75))
            Line((-10.75, 2.75), (-8.75, 2.75))
            Line((-8.75, 2.75), (-8.75, 8.75))
        make_face(mode=Mode.SUBTRACT)
        Polygon((10.75, 3.8126846775), (10.75, 8.75), (10.75, 9.75), (14, 9.75), (14, 8.75), (14, 3.8126846775), align=None, mode=Mode.SUBTRACT)
        with Locations((14, 14)):
            Circle(F0_R, mode=Mode.SUBTRACT)
    extrude(amount=F8_DEPTH, mode=Mode.SUBTRACT)


solid = f1.part
